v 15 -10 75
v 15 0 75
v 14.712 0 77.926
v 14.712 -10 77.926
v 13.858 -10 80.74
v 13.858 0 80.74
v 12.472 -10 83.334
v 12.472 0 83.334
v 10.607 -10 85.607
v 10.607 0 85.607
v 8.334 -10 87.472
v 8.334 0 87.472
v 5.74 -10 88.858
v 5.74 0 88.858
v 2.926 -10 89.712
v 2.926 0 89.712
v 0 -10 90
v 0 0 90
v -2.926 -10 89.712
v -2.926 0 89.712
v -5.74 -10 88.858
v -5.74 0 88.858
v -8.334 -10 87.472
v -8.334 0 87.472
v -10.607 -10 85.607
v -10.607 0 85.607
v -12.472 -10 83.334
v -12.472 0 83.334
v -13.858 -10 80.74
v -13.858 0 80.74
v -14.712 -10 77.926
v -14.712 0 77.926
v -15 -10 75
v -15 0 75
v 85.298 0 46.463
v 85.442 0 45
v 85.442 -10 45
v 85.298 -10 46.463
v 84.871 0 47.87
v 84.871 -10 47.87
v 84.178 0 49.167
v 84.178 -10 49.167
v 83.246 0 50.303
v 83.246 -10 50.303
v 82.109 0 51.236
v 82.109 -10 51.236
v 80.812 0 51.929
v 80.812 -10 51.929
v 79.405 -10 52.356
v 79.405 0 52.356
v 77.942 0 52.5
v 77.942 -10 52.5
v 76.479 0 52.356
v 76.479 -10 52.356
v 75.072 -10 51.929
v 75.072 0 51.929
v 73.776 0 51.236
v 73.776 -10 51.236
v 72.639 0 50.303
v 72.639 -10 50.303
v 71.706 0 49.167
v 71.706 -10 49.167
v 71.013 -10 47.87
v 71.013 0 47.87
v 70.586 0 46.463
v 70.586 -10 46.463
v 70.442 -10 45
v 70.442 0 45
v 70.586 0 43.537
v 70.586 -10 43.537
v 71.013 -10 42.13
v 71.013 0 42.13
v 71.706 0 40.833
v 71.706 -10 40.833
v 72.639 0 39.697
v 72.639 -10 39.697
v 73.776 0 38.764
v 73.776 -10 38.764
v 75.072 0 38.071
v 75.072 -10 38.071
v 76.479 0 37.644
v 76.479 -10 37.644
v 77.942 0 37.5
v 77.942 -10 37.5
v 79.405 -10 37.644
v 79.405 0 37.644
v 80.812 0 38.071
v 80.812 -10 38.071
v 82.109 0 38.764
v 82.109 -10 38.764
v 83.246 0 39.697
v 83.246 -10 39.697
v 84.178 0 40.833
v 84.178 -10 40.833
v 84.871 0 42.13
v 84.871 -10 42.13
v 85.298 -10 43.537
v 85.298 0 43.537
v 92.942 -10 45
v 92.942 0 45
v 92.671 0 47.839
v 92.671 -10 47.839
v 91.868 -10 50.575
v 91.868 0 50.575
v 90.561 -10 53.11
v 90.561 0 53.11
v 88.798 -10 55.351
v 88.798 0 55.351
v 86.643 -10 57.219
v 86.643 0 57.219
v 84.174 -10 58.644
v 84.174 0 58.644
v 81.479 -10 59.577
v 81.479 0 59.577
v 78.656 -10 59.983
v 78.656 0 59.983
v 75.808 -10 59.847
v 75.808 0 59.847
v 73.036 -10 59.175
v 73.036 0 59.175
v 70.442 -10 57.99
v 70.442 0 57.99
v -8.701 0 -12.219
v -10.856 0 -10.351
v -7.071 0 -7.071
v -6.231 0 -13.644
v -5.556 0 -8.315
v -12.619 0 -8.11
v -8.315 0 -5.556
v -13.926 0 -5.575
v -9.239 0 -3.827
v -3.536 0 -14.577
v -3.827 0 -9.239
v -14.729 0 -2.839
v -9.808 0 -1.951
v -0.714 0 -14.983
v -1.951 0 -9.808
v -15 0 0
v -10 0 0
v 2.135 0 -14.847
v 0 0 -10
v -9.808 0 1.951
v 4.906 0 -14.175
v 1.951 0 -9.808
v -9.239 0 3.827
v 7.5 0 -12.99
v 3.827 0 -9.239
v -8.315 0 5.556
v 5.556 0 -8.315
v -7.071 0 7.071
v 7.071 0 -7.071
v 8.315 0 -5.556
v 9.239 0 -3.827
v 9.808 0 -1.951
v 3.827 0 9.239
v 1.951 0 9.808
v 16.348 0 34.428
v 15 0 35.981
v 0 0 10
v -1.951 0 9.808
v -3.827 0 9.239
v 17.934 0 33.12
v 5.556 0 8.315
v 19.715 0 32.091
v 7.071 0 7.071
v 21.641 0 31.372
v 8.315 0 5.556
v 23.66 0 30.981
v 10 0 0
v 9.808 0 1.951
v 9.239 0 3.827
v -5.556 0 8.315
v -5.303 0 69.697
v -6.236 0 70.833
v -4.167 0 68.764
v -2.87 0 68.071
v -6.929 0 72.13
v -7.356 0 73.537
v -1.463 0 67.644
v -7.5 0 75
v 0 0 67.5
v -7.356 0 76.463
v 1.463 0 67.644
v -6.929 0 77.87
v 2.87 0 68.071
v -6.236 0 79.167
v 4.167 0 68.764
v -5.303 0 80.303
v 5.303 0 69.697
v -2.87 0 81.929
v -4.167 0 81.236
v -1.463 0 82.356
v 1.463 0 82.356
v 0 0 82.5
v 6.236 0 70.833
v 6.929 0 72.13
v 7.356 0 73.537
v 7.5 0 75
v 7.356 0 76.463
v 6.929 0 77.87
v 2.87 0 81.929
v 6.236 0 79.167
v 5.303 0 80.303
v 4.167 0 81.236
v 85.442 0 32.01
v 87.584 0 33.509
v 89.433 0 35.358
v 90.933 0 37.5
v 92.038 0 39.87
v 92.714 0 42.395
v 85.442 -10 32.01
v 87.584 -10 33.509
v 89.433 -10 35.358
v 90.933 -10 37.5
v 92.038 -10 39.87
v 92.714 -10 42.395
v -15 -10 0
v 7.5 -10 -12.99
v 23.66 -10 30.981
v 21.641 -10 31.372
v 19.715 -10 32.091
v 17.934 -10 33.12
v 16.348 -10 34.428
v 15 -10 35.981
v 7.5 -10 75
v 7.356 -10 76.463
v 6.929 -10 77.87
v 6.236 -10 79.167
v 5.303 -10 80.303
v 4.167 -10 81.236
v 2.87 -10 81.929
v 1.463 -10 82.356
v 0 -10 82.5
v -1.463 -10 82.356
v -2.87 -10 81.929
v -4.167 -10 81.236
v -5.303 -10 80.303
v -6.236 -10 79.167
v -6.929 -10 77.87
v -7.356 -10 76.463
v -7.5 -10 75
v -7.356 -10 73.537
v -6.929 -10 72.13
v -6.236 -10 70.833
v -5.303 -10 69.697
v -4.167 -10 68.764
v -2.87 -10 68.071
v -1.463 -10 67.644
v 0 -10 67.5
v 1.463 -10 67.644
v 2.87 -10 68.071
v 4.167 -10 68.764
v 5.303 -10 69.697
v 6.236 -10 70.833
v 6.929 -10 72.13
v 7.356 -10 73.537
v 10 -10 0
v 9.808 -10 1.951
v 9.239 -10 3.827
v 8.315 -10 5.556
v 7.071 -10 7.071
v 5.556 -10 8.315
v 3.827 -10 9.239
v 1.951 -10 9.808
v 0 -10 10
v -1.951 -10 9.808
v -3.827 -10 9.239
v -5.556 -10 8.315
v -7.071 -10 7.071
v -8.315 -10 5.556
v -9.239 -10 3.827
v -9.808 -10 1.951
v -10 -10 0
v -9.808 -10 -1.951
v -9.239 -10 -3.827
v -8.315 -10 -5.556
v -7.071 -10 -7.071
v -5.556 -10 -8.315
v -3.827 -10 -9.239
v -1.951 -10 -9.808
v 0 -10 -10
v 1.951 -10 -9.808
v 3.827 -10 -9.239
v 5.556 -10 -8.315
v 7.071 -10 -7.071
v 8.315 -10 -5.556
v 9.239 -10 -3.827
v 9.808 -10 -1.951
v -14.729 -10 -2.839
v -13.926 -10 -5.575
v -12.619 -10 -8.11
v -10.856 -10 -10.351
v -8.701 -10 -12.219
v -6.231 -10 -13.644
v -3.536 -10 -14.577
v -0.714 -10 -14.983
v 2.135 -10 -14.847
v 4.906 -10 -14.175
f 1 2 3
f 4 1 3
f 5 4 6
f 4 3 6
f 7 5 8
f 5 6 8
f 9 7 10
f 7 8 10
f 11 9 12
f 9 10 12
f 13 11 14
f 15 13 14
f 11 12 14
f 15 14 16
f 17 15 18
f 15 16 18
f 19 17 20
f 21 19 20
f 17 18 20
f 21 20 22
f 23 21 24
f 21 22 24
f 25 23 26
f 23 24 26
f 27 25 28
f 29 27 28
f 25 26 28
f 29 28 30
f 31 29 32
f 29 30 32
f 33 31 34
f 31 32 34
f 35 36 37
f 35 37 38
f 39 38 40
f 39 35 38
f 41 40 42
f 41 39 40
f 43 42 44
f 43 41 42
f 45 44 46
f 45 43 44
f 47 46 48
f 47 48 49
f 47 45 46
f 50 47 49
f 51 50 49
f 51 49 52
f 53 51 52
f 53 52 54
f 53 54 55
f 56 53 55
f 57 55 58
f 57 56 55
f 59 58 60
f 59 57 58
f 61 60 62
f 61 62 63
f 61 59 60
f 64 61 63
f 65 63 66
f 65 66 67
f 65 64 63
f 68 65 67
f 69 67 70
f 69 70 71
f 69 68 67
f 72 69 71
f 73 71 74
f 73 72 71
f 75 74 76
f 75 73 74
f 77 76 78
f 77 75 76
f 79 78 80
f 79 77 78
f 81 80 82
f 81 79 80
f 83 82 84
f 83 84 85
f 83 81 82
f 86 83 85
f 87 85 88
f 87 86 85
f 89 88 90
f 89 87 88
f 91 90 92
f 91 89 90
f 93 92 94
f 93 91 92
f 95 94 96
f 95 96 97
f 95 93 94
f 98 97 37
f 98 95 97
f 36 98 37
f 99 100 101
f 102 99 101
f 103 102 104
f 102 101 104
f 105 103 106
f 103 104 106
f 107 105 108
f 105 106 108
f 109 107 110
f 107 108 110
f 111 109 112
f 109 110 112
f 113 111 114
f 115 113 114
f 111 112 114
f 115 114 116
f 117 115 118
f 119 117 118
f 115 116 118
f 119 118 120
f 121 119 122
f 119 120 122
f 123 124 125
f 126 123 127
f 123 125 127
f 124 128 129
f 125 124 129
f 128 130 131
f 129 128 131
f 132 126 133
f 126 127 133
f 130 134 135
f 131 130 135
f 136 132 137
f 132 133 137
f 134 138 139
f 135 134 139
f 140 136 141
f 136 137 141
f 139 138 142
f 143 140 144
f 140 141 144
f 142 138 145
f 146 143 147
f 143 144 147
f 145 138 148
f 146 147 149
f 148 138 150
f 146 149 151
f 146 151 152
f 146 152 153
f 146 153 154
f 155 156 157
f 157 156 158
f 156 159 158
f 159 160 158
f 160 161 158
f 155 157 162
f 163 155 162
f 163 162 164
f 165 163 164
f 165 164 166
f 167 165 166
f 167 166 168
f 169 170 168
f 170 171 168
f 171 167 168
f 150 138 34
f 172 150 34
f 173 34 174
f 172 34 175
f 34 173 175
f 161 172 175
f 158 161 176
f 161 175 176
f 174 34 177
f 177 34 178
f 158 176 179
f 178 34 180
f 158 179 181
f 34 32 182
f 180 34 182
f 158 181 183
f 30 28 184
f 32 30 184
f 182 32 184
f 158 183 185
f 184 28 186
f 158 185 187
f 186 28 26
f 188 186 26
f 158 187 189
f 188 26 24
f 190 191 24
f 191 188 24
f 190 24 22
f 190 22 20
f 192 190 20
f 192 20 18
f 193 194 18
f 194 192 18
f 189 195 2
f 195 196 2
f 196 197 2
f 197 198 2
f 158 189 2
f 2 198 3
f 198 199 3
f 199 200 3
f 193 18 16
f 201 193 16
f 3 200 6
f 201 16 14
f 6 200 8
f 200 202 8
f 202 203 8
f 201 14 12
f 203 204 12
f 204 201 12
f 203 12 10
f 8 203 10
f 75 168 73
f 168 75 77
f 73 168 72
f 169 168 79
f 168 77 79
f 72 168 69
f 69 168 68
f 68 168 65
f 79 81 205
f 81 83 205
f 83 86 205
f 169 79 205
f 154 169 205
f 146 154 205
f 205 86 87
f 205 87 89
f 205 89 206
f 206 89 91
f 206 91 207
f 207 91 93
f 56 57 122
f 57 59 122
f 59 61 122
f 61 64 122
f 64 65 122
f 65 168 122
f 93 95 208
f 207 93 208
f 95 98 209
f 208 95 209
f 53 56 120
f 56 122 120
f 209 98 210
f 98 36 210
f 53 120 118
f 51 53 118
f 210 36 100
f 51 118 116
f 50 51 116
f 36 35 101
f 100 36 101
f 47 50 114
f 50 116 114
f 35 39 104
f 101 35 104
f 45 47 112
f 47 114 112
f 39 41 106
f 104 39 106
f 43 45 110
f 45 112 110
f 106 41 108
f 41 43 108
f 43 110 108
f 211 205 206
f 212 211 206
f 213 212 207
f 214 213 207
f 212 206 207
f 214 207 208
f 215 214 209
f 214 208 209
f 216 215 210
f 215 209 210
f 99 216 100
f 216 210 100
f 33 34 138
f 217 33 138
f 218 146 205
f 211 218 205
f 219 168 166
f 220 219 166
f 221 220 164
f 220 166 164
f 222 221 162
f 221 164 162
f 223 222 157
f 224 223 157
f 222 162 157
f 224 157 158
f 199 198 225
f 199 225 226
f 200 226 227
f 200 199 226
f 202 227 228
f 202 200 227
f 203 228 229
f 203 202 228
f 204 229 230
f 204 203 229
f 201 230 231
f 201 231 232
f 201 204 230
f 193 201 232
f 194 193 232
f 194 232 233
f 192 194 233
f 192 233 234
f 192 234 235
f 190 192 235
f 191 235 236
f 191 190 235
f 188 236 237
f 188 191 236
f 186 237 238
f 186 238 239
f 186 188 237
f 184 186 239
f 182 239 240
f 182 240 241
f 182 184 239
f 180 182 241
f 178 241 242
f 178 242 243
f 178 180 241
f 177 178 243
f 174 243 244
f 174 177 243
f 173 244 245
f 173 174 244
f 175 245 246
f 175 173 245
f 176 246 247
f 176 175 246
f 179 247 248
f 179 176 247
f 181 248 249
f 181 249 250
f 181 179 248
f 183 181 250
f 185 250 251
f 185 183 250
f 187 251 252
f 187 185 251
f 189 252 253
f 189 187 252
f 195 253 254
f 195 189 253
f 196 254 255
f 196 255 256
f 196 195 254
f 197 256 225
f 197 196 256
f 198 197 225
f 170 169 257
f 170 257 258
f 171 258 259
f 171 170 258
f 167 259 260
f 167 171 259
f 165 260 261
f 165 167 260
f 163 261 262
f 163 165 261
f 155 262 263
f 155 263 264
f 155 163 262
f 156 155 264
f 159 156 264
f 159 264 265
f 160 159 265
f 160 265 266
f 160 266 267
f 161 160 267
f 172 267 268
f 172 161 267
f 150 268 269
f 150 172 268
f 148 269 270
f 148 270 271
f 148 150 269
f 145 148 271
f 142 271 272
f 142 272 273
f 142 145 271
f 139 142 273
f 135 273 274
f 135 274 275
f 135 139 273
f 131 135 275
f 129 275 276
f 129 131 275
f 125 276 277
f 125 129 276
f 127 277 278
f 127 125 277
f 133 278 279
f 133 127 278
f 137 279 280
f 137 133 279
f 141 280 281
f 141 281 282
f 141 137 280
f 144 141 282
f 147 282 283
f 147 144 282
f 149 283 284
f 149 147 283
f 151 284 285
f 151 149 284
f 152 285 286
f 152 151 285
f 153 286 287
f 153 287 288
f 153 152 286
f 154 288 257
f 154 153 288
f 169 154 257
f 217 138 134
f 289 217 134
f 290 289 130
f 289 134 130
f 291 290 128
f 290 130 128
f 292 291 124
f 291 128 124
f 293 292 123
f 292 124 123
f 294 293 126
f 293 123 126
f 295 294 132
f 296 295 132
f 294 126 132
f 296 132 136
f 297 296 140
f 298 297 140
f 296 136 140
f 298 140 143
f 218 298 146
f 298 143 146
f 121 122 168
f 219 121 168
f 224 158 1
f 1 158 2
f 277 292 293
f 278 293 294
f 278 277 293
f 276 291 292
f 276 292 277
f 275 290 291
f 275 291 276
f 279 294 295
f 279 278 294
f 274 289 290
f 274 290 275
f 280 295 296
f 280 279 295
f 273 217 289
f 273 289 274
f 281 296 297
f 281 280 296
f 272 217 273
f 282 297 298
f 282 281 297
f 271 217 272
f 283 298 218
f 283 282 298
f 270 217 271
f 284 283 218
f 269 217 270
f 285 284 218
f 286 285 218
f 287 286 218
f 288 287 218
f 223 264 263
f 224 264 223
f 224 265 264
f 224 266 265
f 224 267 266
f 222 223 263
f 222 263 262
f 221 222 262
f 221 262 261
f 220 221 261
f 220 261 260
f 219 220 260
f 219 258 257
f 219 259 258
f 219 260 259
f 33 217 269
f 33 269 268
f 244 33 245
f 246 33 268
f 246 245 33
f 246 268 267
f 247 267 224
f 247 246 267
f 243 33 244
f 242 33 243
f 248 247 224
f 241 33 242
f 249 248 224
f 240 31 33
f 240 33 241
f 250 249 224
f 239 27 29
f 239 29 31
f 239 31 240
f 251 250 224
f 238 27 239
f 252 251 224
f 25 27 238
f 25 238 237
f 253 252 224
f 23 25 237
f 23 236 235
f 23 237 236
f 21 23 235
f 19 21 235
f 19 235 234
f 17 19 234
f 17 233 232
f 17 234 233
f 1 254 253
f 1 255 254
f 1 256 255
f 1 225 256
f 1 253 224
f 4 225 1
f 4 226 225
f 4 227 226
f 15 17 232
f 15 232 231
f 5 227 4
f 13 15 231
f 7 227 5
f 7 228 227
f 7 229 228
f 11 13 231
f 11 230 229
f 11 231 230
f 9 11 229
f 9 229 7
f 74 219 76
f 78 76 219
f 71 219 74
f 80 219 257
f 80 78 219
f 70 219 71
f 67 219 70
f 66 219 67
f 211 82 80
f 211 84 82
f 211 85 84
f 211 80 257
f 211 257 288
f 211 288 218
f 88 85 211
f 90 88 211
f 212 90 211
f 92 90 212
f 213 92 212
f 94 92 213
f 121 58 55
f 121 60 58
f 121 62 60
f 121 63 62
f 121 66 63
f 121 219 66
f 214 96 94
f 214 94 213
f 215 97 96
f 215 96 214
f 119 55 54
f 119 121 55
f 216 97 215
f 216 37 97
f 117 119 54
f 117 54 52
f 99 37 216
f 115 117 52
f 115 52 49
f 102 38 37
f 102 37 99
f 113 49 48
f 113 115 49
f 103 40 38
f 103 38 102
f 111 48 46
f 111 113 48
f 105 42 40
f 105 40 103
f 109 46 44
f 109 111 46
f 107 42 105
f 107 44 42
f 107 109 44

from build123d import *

# Parameters (mm, degrees)
F0_R     = 7.5
F0_R_2   = 10
F1_DEPTH = 10


with BuildPart() as f1:
    # F0 (on Front) → F1 (new body)
    with BuildSketch(Plane.XZ):
        with BuildLine():
            ThreePointArc((-15, 75), (0, 60), (15, 75))
            ThreePointArc((15, 75), (0, 90), (-15, 75))
        make_face()
        with Locations((0, 75)):
            Circle(F0_R, mode=Mode.SUBTRACT)
        with BuildLine():
            Line((15, 35.980762), (15, 75))
            ThreePointArc((15, 75), (0, 60), (-15, 75))
            Line((-15, 75), (-15, 0))
            ThreePointArc((-15, 0), (0, 15), (15, 0))
            ThreePointArc((15, 0), (12.990381, -7.5), (7.5, -12.990381))
            Line((7.5, -12.990381), (85.442286, 32.009619))
            ThreePointArc((85.442286, 32.009619), (64.951905, 37.5), (70.442286, 57.990381))
            Line((70.442286, 57.990381), (23.660254, 30.980762))
            ThreePointArc((23.660254, 30.980762), (18.803432, 32.568499), (15, 35.980762))
        make_face()
        with BuildLine():
            ThreePointArc((15, 0), (0, 15), (-15, 0))
            ThreePointArc((-15, 0), (-7.5, -12.990381), (7.5, -12.990381))
            ThreePointArc((7.5, -12.990381), (12.990381, -7.5), (15, 0))
        make_face()
        Circle(F0_R_2, mode=Mode.SUBTRACT)
        with BuildLine():
            ThreePointArc((92.942286, 45), (85.442286, 57.990381), (70.442286, 57.990381))
            ThreePointArc((70.442286, 57.990381), (64.951905, 37.5), (85.442286, 32.009619))
            ThreePointArc((85.442286, 32.009619), (90.932667, 37.5), (92.942286, 45))
        make_face()
        with Locations((77.942286, 45)):
            Circle(F0_R, mode=Mode.SUBTRACT)
    extrude(amount=F1_DEPTH)


solid = f1.part
